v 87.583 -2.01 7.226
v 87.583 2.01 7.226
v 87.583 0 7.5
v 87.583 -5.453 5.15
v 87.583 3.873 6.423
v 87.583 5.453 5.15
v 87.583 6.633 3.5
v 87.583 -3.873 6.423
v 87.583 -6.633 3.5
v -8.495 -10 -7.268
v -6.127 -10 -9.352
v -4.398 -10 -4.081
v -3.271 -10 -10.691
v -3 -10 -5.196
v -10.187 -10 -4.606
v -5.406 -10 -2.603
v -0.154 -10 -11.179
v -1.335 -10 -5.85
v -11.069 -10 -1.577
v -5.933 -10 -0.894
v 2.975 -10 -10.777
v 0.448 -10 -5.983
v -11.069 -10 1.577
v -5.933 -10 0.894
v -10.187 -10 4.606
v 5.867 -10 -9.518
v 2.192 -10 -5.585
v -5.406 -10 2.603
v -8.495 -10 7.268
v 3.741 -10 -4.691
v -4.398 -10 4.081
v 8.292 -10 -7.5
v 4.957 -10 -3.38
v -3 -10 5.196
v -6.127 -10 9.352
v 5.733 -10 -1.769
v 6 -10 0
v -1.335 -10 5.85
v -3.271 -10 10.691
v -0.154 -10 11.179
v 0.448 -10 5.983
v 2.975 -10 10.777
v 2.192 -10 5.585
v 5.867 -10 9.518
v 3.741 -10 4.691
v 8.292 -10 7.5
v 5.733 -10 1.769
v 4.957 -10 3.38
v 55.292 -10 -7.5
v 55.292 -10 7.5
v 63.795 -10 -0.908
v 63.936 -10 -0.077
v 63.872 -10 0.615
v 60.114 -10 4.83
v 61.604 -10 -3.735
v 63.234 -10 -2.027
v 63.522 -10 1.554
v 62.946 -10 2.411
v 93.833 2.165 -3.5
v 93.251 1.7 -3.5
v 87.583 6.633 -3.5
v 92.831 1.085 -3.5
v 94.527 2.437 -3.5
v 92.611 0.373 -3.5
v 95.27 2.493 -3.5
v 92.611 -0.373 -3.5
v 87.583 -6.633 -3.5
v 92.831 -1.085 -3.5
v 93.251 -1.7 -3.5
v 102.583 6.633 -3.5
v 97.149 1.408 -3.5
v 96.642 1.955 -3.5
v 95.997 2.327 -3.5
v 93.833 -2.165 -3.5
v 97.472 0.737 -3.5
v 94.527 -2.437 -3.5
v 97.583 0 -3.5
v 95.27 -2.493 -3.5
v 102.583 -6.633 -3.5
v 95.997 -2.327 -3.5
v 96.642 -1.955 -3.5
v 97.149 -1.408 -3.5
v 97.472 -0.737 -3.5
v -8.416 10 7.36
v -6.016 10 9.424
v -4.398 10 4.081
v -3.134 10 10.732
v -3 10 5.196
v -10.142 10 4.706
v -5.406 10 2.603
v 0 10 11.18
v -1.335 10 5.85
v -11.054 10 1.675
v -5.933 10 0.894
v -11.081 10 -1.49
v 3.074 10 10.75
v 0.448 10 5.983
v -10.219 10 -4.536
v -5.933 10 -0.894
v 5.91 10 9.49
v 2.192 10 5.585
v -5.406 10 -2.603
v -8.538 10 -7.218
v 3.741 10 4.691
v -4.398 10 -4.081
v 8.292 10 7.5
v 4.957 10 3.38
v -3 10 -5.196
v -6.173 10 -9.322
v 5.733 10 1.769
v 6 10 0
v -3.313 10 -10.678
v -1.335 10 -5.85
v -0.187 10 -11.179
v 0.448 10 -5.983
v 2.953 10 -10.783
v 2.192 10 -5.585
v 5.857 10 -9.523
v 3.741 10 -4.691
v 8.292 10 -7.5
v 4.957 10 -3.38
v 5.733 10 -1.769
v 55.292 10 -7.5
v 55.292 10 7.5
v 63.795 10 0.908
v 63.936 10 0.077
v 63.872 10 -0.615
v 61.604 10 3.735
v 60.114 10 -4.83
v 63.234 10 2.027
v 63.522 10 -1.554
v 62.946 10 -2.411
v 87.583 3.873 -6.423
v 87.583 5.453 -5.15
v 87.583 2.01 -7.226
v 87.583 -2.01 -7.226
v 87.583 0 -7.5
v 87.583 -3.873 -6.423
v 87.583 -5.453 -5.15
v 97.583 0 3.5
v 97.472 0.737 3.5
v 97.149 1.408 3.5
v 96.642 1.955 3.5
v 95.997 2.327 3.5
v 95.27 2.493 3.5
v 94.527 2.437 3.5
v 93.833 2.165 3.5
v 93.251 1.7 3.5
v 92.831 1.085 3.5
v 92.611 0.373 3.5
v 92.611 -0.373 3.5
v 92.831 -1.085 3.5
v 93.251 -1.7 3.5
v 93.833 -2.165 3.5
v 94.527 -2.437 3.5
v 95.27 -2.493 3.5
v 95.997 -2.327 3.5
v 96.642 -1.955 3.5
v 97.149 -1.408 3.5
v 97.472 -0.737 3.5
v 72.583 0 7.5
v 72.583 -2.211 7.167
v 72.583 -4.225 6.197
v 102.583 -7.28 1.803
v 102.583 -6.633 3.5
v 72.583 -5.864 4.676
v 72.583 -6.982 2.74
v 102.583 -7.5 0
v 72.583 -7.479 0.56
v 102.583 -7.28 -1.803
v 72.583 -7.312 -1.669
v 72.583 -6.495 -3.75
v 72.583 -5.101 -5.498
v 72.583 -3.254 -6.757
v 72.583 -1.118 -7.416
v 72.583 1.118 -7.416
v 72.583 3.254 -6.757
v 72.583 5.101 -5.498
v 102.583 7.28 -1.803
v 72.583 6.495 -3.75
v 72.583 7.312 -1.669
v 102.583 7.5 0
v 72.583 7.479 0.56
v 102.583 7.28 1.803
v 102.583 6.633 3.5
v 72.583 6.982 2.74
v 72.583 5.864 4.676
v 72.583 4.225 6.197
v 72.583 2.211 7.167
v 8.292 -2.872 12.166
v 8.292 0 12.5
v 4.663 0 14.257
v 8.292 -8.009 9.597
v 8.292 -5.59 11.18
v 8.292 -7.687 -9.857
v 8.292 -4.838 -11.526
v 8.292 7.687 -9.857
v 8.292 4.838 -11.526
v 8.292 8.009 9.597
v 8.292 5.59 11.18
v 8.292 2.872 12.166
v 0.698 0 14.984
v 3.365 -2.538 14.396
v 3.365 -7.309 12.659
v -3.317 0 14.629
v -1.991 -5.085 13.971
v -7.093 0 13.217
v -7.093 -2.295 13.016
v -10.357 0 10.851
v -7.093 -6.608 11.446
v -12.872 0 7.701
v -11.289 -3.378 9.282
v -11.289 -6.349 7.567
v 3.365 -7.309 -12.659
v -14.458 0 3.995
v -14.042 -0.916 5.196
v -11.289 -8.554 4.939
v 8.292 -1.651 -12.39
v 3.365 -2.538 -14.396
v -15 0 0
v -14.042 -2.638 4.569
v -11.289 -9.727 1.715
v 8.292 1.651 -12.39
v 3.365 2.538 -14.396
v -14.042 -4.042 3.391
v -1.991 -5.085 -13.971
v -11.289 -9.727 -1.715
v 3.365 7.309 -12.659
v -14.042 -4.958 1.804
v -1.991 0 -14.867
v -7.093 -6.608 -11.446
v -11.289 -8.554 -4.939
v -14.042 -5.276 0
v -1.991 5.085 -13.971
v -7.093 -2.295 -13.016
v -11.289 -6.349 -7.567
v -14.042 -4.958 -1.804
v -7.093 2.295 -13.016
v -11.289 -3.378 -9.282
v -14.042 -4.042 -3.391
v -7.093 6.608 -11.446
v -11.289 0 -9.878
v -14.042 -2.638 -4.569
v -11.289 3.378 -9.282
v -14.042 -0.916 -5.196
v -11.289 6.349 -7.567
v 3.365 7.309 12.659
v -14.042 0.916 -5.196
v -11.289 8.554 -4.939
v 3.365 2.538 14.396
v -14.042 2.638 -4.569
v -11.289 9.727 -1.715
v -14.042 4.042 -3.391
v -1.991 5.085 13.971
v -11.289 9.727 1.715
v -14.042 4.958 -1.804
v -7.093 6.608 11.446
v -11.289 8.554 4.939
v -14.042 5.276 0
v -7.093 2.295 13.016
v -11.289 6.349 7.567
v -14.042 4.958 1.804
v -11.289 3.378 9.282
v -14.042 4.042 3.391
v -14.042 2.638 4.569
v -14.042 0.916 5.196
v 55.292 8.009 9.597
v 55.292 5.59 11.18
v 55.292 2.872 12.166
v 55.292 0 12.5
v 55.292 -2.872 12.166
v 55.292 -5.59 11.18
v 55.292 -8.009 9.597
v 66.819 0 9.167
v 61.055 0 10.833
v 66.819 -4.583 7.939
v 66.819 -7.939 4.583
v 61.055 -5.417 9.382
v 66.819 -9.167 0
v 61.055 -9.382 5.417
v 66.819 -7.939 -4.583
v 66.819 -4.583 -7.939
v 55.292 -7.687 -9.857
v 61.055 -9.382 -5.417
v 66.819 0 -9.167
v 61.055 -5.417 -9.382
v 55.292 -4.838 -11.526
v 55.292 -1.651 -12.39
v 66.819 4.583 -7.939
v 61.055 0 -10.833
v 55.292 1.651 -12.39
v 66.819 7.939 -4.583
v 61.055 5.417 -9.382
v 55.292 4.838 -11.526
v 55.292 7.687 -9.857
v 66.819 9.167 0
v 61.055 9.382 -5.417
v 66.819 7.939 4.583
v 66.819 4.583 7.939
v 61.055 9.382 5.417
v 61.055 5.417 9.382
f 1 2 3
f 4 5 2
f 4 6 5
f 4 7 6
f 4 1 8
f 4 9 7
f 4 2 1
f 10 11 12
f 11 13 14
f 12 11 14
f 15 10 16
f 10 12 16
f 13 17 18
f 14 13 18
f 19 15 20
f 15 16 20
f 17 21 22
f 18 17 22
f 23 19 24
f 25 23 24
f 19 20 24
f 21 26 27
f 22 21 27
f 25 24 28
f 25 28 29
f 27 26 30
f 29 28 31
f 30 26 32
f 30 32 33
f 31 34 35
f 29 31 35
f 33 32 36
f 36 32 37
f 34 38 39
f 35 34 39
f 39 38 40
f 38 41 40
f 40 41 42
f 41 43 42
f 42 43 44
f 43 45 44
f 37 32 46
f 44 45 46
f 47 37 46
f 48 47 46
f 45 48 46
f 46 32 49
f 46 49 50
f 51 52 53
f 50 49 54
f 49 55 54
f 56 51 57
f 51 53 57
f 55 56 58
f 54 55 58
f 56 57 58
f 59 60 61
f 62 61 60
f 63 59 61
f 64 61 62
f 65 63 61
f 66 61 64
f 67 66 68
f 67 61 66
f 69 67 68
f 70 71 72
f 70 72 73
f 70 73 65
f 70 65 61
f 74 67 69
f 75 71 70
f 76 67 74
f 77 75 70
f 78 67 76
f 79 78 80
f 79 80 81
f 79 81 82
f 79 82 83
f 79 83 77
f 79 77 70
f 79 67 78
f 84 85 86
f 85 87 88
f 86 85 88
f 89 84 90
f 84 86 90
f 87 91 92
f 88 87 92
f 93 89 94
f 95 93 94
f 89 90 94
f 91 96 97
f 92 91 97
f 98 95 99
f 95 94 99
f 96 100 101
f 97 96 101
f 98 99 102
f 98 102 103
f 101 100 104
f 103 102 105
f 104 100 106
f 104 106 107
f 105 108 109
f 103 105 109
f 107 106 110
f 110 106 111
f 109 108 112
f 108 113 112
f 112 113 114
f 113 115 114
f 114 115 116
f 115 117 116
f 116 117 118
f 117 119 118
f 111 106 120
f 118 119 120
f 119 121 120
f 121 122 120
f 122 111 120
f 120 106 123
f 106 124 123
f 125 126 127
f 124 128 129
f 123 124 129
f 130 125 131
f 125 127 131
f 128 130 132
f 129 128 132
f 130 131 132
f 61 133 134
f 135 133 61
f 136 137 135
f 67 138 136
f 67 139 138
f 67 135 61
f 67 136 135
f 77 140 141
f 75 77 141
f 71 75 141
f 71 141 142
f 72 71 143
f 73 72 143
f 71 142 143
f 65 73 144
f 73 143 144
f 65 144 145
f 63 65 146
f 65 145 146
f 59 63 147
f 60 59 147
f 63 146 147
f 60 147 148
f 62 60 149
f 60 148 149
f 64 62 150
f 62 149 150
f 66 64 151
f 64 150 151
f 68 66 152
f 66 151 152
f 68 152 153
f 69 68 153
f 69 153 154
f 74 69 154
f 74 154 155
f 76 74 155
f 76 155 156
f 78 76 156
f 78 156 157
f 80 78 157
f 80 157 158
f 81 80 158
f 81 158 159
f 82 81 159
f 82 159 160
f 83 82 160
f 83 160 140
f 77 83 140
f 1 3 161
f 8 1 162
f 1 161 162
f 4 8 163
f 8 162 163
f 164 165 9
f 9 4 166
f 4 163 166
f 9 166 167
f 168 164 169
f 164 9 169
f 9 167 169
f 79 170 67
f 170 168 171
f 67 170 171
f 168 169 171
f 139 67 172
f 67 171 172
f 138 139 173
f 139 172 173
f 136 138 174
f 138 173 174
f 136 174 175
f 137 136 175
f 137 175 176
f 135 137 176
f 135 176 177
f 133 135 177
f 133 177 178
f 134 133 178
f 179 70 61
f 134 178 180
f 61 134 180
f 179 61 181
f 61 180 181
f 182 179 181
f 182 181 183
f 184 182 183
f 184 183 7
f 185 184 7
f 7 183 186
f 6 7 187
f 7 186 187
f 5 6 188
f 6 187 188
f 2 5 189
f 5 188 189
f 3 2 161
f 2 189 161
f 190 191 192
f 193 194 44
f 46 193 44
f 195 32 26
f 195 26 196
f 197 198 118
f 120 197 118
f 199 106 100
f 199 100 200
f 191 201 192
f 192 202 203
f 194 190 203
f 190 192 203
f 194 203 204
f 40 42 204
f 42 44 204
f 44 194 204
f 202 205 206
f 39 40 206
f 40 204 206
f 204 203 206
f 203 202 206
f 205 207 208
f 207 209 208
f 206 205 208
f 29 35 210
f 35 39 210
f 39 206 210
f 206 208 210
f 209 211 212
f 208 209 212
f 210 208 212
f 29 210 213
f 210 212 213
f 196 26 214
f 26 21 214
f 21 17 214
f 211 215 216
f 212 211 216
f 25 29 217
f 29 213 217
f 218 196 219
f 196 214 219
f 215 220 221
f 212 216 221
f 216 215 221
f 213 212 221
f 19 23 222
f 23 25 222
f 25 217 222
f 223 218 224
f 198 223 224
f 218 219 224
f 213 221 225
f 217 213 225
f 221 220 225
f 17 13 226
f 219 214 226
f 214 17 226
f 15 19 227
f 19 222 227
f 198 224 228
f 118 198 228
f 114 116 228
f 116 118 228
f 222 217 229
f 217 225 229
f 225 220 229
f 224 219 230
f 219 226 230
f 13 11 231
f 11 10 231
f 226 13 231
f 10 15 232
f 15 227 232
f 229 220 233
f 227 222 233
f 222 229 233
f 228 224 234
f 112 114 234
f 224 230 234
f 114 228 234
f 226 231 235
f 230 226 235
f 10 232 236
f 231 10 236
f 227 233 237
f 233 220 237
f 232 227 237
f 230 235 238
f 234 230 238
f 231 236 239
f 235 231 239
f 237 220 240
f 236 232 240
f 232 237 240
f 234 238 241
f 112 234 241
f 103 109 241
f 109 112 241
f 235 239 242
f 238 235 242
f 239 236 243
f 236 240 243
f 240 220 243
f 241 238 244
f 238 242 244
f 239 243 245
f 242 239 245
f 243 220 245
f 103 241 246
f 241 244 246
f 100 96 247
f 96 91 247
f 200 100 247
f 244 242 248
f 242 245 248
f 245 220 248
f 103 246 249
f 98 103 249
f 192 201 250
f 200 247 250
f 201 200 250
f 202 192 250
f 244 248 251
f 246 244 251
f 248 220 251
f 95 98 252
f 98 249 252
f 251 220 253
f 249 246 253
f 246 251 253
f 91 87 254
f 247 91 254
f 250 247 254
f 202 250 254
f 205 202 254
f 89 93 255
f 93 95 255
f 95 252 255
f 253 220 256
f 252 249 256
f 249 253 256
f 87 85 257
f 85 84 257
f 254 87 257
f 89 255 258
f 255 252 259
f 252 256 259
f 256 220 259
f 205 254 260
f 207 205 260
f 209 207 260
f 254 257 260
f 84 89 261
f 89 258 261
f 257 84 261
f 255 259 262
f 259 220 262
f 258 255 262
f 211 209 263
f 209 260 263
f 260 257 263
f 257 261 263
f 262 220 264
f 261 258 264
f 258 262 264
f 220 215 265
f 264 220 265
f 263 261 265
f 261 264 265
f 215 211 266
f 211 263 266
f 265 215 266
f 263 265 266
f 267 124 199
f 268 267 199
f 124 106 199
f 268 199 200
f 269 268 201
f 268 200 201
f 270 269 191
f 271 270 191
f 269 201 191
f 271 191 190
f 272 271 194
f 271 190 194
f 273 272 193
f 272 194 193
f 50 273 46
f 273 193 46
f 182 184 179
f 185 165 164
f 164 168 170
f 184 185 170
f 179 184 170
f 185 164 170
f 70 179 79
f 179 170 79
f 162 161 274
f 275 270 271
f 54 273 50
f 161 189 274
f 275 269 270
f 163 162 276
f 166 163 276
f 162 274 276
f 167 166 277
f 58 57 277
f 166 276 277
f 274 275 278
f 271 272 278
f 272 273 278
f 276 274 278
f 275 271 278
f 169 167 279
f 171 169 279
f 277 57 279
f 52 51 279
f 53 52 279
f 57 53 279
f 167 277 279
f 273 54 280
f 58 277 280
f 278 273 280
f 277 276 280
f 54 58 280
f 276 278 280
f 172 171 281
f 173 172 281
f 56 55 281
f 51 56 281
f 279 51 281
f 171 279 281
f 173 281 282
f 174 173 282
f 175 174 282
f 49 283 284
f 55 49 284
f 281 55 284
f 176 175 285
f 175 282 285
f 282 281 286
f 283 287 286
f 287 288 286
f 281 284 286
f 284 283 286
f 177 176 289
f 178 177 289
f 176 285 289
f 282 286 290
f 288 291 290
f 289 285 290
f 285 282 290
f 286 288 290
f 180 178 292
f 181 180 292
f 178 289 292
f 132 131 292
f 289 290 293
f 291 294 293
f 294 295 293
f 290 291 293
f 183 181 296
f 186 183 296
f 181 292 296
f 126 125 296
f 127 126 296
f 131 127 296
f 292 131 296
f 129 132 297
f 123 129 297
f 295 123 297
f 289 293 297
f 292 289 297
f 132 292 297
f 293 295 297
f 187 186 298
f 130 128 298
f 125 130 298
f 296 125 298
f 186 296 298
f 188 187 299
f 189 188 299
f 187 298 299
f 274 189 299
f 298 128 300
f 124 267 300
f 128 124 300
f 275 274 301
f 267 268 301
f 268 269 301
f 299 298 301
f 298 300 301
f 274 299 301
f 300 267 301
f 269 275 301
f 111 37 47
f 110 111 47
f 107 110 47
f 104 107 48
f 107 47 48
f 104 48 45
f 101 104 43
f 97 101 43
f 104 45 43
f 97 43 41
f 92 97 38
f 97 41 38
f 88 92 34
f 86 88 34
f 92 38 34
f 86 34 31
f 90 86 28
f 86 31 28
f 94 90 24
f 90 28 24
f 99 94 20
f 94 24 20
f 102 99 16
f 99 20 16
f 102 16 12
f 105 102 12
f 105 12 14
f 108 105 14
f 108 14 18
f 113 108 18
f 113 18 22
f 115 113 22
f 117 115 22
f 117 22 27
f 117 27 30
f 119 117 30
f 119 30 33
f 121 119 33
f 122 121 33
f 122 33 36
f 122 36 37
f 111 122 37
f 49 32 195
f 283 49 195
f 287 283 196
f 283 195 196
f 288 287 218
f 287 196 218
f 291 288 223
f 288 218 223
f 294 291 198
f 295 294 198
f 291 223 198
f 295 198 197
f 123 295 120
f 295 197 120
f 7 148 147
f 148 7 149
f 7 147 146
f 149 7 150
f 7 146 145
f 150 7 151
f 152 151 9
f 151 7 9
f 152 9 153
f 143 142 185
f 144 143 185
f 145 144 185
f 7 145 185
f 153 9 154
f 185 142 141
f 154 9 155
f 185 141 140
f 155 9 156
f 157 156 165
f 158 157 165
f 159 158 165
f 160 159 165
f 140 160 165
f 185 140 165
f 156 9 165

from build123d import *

# Parameters (mm, degrees)
F2_W          = 15
F2_H          = 4
F3_DEPTH      = 15.001
F3_DEPTH_BACK = 15.001
F5_DEPTH      = 117.5841784417
F6_R          = 6
F7_DEPTH      = 20.001
F8_R          = 2.5
F9_DEPTH      = 18.501


with BuildPart() as f1:
    # F0 (on Front) → F1 (revolve)
    with BuildSketch(Plane.XZ):
        with BuildLine():
            ThreePointArc((8.2915619759, 12.5), (-7.0931858273, 13.2169101843), (-15, 0))
            Line((-15, 0), (102.5831784417, 0))
            Line((102.5831784417, 0), (102.5831784417, 7.5))
            Line((102.5831784417, 7.5), (72.5831784417, 7.5))
            Line((72.5831784417, 7.5), (55.2915619759, 12.5))
            Line((55.2915619759, 12.5), (8.2915619759, 12.5))
        make_face()
    revolve(axis=Axis((64.8176119516, 0, 0), (1, 0, 0)))

    # F2 (on Front) → F3 (cut, two sides)
    with BuildSketch(Plane.XZ) as f3_sk:
        with Locations((95.0831784417, 5.5)):
            Rectangle(F2_W, F2_H)
        with Locations((95.0831784417, -5.5)):
            Rectangle(F2_W, F2_H)
    extrude(amount=-F3_DEPTH, mode=Mode.SUBTRACT)
    extrude(f3_sk.sketch, amount=F3_DEPTH_BACK, mode=Mode.SUBTRACT)

    # F4 (on face) → F5 (cut, through all)
    with BuildSketch(Plane.YZ.offset(102.5831784417)):
        with BuildLine():
            Line((-10, -11.1803398875), (-10, 11.1803398875))
            ThreePointArc((-10, 11.1803398875), (-15, 0), (-10, -11.1803398875))
        make_face()
        with BuildLine():
            ThreePointArc((10, -11.1803398875), (15, 0), (10, 11.1803398875))
            Line((10, 11.1803398875), (10, -11.1803398875))
        make_face()
    extrude(amount=-F5_DEPTH, mode=Mode.SUBTRACT)

    # F6 (on face) → F7 (cut, through all)
    with BuildSketch(Plane.XZ.offset(10)):
        Circle(F6_R)
    extrude(amount=-F7_DEPTH, mode=Mode.SUBTRACT)

    # F8 (on face) → F9 (cut, through all)
    with BuildSketch(Plane.XY.offset(3.5)):
        with Locations((95.0831784417, 0)):
            Circle(F8_R)
    extrude(amount=-F9_DEPTH, mode=Mode.SUBTRACT)


solid = f1.part
